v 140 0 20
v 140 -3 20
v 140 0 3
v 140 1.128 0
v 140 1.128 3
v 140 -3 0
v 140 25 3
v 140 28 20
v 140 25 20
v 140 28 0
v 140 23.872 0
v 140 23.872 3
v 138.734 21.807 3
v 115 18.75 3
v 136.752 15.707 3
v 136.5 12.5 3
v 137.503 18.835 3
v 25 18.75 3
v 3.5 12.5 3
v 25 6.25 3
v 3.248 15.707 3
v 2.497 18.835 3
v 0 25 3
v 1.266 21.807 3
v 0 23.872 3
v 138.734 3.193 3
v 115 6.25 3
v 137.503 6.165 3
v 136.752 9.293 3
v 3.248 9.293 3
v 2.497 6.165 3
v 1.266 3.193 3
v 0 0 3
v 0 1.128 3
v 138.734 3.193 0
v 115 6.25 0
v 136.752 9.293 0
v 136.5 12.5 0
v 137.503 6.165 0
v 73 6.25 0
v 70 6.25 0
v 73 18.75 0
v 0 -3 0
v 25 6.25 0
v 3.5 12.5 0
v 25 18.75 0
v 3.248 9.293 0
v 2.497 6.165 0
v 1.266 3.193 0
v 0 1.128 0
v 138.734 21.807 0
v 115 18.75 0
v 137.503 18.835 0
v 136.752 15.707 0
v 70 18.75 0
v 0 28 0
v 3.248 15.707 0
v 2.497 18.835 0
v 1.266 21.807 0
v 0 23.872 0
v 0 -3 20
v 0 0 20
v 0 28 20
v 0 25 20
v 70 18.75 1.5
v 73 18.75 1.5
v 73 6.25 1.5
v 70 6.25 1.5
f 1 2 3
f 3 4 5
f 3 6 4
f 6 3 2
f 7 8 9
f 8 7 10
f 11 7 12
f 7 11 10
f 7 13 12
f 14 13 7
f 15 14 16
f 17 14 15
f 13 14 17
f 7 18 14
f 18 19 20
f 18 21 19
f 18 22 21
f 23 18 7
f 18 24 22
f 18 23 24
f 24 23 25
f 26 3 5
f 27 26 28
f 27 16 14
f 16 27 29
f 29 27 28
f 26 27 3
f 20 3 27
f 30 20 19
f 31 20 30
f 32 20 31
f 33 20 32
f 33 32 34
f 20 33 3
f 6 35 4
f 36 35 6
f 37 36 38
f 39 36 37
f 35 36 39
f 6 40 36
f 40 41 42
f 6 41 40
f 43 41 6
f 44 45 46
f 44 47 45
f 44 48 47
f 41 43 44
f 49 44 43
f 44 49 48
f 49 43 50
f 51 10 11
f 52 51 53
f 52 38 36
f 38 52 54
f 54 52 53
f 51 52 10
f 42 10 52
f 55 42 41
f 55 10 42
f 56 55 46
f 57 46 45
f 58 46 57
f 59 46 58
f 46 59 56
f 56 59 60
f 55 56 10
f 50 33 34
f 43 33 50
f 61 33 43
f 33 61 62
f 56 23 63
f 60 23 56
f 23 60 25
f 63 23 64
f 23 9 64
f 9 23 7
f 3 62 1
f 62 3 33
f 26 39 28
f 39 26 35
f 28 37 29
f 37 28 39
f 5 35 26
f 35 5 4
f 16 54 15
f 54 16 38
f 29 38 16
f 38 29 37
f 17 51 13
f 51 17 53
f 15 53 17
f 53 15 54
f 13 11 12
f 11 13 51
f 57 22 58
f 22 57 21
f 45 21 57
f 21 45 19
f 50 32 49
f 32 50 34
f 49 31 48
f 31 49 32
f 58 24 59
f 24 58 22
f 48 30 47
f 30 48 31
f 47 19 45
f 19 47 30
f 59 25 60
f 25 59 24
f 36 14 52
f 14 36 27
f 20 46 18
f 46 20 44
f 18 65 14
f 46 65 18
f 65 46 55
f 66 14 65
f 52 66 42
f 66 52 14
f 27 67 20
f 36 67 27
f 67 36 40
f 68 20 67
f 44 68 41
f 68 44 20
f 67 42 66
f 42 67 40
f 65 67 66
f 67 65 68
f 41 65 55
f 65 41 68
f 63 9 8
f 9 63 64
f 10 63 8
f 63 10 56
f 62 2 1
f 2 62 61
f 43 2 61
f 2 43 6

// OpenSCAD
// Main parameters
// Total length of spool from end to end
totalLength = 140;
// Inner width of spool (should be bigger than the width of your bobber)
innerWidth = 25;
// Thickness of walls
wallThickness = 3;
// The height of the walls (+ thickness of walls)
wallHeight = 17 + wallThickness;

// End circles
// How "deep" into the main part should the circles be moved
circleDepth = 17;
// Normally 0, but if the above circleDepth value is high you can add here to get smoother circle
circleRadiusExtra = 8;

// Inner rectangular hole
// Length of the inner hole
holeLength = totalLength - 50;
// Width of the inner hole
holeWidth = innerWidth/2;

// Smoothness (of circles). 
// Can be put lower when testing for better performance, 
// and higher for final export
$fn = 40;

// Uncomment for splitting in half if your build plate is too small
// You need Johannes' OpenSCAD library in your path (https://github.com/jernst/josl)
/*
use <josl/cuts/puzzle.scad>

Puzzle( y=[3.5,16.5]) {
    translate( [ -totalLength/2, 0, 0 ] ) {
        wholeSpool();
   } 
}

*/

wholeSpool();



module fullSpool () {
    color("blue")
    cube([totalLength,innerWidth,wallThickness]);
}

module endCircle (){
    color("red")
    linear_extrude(height = wallThickness+5, center = true, convexity = 10, twist = 0)
    circle(r = (innerWidth/2)+circleRadiusExtra);
}

module sidePanel (){
    color("green")
    cube([totalLength,wallThickness,wallHeight]);

}

module middlePin (){
    color("orange")
    cube([3,innerWidth,wallThickness/2]);
}

module innerHole (){
    color("green")
    cube([holeLength,holeWidth,50]);
}

module wholeSpool() {
    difference() {
    {
        {
            difference() 
            {
            fullSpool();
            translate([totalLength + circleDepth , innerWidth/2, 0]) endCircle();
            translate([-circleDepth, innerWidth/2, 0]) endCircle();
            }

        }
    }
translate([(totalLength-holeLength)/2,holeWidth/2 , -20]) innerHole();
}

translate([totalLength/2, 0  , 0]) middlePin();

translate([0, innerWidth, 0]) sidePanel();
translate([0, -wallThickness, 0]) sidePanel();
}
